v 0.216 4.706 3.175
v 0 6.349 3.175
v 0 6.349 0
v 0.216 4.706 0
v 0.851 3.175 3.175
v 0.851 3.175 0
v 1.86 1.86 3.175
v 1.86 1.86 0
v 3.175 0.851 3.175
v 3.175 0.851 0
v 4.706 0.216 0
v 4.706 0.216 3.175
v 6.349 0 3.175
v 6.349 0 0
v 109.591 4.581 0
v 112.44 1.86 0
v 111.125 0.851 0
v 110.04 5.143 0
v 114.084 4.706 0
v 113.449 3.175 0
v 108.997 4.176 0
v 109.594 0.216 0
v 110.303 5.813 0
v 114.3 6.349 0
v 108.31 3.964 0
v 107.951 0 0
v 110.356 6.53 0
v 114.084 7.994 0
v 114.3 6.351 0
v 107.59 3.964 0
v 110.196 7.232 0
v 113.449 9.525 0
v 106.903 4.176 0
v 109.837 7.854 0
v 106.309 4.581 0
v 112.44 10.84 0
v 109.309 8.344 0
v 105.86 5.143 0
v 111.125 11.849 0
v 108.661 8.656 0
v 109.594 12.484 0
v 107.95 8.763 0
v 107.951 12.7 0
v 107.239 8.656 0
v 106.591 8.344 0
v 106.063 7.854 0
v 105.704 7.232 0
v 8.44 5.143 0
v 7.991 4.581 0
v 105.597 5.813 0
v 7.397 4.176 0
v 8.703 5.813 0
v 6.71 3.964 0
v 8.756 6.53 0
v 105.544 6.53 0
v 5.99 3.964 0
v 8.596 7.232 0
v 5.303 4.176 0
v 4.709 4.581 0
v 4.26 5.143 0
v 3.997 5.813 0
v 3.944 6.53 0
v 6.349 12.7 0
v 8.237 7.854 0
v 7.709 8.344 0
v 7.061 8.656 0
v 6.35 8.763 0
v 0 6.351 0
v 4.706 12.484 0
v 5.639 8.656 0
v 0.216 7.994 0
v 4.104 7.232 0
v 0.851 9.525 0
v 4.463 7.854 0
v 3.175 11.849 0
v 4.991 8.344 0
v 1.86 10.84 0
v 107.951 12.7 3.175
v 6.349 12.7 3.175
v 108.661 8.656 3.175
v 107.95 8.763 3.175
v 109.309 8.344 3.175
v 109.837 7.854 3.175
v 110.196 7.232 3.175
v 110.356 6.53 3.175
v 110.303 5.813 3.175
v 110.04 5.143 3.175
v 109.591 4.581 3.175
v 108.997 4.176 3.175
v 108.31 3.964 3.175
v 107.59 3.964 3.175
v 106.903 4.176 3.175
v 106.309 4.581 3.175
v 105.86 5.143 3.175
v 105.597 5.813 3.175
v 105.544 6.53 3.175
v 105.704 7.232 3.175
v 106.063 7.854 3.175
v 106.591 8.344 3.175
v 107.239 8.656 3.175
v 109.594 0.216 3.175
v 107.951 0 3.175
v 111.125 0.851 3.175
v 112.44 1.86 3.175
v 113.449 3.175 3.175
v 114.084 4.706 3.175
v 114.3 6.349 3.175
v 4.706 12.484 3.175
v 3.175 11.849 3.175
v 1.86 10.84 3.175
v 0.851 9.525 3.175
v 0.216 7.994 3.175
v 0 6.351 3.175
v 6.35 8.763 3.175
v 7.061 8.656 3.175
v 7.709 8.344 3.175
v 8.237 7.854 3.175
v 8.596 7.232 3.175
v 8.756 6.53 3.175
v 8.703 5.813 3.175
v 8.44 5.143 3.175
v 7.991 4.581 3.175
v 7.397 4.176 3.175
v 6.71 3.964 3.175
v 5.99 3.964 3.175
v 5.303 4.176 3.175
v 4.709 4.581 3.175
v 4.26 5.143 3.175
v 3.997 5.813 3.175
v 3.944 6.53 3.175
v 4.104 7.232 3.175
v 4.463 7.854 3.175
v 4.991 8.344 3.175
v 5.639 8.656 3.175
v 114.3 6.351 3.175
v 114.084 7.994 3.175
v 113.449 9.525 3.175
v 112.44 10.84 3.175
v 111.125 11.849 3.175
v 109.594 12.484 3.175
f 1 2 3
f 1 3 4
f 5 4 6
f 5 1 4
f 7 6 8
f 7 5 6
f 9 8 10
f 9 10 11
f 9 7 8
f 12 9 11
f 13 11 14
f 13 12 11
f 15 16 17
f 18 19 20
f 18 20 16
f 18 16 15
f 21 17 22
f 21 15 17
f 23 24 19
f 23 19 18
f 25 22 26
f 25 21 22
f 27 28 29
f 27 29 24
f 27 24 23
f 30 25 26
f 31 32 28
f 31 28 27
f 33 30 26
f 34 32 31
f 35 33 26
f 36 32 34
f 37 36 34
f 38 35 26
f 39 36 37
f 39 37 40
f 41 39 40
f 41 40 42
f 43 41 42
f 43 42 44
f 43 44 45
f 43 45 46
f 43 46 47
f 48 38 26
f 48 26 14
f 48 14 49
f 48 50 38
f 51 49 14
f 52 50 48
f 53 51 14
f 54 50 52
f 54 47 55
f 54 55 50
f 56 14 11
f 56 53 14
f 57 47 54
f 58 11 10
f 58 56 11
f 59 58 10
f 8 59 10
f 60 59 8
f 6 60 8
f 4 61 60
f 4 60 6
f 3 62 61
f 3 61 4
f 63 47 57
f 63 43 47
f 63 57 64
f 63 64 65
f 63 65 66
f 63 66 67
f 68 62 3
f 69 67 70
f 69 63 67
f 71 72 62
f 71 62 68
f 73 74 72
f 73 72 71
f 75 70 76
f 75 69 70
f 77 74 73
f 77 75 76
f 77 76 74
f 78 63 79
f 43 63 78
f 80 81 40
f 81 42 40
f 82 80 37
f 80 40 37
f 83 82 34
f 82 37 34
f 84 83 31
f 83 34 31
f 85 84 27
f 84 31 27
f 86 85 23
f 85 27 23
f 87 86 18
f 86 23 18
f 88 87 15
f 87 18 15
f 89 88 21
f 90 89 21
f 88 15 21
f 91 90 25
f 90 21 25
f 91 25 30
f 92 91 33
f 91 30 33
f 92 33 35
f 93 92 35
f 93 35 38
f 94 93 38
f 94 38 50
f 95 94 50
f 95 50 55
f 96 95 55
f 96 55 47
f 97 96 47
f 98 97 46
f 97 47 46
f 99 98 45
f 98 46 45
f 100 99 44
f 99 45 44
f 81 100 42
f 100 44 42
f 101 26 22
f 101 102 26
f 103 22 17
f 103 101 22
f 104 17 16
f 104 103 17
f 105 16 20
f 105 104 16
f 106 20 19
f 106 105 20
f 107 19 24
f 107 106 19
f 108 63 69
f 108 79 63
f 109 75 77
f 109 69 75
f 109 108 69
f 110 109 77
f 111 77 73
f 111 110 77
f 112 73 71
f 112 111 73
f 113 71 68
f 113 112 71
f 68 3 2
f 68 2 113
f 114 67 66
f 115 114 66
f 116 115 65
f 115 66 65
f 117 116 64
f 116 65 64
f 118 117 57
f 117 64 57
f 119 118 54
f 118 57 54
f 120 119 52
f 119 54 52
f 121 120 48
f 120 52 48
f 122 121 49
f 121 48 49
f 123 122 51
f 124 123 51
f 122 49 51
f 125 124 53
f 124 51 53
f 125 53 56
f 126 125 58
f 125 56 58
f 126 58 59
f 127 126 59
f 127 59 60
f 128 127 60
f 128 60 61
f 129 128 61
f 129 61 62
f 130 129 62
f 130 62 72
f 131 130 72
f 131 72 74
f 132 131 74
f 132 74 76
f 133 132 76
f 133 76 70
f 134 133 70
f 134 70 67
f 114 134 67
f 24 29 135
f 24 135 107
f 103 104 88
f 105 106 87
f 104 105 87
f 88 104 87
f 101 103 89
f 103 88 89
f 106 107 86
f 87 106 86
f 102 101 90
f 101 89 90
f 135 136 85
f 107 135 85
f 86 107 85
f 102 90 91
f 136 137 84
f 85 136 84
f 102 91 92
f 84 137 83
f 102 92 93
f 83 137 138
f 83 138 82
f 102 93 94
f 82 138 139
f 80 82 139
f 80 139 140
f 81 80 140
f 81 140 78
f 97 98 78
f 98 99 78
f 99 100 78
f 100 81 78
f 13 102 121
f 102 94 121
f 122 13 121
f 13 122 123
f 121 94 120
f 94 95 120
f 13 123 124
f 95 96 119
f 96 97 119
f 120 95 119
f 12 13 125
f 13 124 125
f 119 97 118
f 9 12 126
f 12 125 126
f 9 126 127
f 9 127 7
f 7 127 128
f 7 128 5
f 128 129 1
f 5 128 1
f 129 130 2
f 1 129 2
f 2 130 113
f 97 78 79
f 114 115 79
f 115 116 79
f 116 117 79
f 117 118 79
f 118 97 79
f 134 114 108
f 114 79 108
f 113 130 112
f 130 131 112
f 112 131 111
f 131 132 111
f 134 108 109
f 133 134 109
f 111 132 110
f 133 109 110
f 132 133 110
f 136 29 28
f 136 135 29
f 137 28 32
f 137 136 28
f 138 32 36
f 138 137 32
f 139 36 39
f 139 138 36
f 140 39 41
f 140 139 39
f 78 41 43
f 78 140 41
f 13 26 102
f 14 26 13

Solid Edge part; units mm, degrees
sketch "Sketch1" plane through (0, 0, 0) normal (0, 0, 1) x (1, 0, 0)
  line L0 (0, 0) -> (0, 12.7)
  line L1 (0, 12.7) -> (114.3, 12.7)
  line L2 (114.3, 12.7) -> (114.3, 0)
  line L3 (114.3, 0) -> (0, 0)
  dimension "D1" = 12.7
  dimension "D2" = 114.3
extrude "Protrusion1" add sketch "Sketch1" along normal blind 3.175
fillet "Round_1" radius 6.35 4 edges at (0, 12.7, 1.5875) (0, 0, 1.5875) (114.3, 0, 1.5875) (114.3, 12.7, 1.5875)
hole "Hole_1" at (6.35, 6.35, 0) direction (0, 0, 1) diameter 4.826 end through all
hole "Hole1" at (107.95, 6.35, 0) direction (0, 0, 1) diameter 4.826 end through all
properties part number "SR-06" material "Aluminum, 6061-T6"
